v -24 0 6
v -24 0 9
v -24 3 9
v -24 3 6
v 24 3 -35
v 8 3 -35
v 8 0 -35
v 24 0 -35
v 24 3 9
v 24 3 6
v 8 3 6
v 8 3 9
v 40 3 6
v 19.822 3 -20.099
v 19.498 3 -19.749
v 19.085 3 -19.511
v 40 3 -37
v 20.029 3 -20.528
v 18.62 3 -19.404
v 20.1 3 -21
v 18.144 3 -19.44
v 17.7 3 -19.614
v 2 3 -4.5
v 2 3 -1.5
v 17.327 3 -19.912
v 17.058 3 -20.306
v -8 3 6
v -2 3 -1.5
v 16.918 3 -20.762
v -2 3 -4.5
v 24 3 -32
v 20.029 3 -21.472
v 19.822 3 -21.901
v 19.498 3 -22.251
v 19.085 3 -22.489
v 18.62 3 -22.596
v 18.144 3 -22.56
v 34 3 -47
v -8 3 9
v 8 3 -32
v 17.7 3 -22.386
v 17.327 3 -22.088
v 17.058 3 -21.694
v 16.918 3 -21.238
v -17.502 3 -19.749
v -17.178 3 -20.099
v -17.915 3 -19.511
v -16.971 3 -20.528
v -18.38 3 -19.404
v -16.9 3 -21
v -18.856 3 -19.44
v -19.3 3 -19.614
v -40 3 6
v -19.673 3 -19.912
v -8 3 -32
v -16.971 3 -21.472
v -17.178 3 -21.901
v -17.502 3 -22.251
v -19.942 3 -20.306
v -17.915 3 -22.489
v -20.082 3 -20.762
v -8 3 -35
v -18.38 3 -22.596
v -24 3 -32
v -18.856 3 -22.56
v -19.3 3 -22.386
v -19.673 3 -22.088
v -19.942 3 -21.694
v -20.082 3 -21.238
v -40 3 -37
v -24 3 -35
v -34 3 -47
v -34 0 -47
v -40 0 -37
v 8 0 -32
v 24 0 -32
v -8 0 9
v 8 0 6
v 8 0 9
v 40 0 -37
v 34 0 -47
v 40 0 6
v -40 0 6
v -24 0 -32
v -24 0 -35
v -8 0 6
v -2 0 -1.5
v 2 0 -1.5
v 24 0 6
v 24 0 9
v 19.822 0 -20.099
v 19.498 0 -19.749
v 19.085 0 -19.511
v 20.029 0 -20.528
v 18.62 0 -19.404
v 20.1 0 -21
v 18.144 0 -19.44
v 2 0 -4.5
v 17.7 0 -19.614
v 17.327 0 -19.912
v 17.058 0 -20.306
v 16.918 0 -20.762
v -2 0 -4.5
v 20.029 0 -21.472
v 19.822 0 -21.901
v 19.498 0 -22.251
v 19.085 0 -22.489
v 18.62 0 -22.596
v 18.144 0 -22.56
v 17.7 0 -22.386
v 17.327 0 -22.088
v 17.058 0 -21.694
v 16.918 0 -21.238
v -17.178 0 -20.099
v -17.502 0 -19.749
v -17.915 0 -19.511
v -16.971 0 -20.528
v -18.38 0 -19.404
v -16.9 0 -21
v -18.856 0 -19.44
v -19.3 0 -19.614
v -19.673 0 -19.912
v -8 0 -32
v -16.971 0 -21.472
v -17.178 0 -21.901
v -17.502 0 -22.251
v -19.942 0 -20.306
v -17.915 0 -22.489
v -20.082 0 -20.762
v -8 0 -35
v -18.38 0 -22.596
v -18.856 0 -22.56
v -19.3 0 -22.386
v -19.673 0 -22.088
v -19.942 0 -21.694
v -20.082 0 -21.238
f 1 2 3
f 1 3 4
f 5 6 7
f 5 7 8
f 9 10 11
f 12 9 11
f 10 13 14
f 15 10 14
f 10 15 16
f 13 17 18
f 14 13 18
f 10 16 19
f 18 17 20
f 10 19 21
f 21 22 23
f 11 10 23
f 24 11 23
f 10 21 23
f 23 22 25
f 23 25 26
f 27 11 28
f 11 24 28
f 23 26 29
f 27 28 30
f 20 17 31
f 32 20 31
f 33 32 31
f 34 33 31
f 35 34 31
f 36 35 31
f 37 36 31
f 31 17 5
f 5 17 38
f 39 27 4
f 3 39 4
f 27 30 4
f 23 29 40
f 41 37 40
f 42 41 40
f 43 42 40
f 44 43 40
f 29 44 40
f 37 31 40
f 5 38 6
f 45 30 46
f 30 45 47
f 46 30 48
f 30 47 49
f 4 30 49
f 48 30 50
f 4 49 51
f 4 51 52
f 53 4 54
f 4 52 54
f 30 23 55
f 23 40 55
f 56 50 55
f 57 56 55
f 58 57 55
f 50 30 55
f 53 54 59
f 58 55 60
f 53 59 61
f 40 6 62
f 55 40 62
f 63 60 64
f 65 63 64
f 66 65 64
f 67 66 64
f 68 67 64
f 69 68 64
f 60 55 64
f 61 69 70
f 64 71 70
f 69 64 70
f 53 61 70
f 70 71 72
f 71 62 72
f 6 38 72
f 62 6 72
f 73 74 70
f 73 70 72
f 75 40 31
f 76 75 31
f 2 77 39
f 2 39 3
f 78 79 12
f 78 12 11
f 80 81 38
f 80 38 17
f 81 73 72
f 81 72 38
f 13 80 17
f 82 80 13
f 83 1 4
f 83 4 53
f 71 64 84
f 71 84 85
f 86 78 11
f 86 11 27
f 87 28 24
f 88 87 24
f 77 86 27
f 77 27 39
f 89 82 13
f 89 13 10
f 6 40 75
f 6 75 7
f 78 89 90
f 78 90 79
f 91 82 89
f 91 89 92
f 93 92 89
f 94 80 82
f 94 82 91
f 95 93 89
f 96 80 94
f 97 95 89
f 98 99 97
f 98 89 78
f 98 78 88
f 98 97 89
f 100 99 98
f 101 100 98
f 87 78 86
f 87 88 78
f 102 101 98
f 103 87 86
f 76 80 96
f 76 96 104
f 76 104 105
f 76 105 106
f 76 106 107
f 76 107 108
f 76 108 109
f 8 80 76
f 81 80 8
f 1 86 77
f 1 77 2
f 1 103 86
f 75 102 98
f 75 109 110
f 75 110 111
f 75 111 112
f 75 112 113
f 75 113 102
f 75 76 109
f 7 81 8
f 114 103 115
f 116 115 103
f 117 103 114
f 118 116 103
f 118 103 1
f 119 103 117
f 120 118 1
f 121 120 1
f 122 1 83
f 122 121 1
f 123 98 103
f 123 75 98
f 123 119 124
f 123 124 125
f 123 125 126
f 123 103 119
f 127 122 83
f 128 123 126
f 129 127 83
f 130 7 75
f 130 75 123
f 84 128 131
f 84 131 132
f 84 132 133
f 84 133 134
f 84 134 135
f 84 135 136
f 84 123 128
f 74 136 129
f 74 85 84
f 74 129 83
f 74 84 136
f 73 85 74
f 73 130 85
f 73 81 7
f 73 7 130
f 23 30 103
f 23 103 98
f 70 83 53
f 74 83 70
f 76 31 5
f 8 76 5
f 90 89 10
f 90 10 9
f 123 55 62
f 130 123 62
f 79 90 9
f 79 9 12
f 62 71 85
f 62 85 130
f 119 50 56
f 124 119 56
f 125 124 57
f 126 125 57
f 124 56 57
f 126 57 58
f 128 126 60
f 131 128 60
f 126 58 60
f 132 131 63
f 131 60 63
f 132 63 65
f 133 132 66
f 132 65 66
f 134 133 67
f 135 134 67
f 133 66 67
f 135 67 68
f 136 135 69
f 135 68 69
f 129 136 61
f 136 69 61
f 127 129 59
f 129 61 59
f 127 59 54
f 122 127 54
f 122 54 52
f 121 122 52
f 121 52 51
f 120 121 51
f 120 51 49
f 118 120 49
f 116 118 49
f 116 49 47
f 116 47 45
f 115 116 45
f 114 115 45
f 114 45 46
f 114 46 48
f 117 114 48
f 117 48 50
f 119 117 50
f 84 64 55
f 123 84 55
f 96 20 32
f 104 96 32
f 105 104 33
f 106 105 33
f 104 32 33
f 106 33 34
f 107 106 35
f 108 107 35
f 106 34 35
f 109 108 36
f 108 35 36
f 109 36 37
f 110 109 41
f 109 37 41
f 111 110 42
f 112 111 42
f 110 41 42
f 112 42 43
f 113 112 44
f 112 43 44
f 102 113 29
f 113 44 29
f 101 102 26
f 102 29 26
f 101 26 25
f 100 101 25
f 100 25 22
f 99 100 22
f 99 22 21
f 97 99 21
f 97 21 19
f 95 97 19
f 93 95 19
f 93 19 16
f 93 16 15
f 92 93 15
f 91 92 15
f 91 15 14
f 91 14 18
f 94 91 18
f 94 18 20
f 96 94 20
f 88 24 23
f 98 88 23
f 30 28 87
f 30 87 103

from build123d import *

# Parameters (mm, degrees)
BOSS_EXTRUDE1_DEPTH = 3
SKETCH2_R           = 1.6
SKETCH2_W           = 4
SKETCH2_H           = 3
SKETCH2_W_2         = 16
CUT_EXTRUDE1_DEPTH  = 4


with BuildPart() as part:
    # Sketch1 → Boss-Extrude1 (new body)
    with BuildSketch(Plane(origin=(0, 0, 0), x_dir=(1, 0, 0), z_dir=(0, 1, 0))):
        Polygon((-40, 37), (-34, 47), (34, 47), (40, 37), (40, -6), (24, -6), (24, -9), (8, -9), (8, -6), (-8, -6), (-8, -9), (-24, -9), (-24, -6), (-40, -6), align=None)
    extrude(amount=BOSS_EXTRUDE1_DEPTH)

    # Sketch2 → Cut-Extrude1 (cut, through all)
    with BuildSketch(Plane(origin=(0, 3, 0), x_dir=(1, 0, 0), z_dir=(0, 1, 0))):
        with Locations((-18.5, 21)):
            Circle(SKETCH2_R)
        with Locations((18.5, 21)):
            Circle(SKETCH2_R)
        with Locations((0, 3)):
            Rectangle(SKETCH2_W, SKETCH2_H)
        with Locations((-16, 33.5)):
            Rectangle(SKETCH2_W_2, SKETCH2_H)
        with Locations((16, 33.5)):
            Rectangle(SKETCH2_W_2, SKETCH2_H)
    extrude(amount=-CUT_EXTRUDE1_DEPTH, mode=Mode.SUBTRACT)


solid = part.part
